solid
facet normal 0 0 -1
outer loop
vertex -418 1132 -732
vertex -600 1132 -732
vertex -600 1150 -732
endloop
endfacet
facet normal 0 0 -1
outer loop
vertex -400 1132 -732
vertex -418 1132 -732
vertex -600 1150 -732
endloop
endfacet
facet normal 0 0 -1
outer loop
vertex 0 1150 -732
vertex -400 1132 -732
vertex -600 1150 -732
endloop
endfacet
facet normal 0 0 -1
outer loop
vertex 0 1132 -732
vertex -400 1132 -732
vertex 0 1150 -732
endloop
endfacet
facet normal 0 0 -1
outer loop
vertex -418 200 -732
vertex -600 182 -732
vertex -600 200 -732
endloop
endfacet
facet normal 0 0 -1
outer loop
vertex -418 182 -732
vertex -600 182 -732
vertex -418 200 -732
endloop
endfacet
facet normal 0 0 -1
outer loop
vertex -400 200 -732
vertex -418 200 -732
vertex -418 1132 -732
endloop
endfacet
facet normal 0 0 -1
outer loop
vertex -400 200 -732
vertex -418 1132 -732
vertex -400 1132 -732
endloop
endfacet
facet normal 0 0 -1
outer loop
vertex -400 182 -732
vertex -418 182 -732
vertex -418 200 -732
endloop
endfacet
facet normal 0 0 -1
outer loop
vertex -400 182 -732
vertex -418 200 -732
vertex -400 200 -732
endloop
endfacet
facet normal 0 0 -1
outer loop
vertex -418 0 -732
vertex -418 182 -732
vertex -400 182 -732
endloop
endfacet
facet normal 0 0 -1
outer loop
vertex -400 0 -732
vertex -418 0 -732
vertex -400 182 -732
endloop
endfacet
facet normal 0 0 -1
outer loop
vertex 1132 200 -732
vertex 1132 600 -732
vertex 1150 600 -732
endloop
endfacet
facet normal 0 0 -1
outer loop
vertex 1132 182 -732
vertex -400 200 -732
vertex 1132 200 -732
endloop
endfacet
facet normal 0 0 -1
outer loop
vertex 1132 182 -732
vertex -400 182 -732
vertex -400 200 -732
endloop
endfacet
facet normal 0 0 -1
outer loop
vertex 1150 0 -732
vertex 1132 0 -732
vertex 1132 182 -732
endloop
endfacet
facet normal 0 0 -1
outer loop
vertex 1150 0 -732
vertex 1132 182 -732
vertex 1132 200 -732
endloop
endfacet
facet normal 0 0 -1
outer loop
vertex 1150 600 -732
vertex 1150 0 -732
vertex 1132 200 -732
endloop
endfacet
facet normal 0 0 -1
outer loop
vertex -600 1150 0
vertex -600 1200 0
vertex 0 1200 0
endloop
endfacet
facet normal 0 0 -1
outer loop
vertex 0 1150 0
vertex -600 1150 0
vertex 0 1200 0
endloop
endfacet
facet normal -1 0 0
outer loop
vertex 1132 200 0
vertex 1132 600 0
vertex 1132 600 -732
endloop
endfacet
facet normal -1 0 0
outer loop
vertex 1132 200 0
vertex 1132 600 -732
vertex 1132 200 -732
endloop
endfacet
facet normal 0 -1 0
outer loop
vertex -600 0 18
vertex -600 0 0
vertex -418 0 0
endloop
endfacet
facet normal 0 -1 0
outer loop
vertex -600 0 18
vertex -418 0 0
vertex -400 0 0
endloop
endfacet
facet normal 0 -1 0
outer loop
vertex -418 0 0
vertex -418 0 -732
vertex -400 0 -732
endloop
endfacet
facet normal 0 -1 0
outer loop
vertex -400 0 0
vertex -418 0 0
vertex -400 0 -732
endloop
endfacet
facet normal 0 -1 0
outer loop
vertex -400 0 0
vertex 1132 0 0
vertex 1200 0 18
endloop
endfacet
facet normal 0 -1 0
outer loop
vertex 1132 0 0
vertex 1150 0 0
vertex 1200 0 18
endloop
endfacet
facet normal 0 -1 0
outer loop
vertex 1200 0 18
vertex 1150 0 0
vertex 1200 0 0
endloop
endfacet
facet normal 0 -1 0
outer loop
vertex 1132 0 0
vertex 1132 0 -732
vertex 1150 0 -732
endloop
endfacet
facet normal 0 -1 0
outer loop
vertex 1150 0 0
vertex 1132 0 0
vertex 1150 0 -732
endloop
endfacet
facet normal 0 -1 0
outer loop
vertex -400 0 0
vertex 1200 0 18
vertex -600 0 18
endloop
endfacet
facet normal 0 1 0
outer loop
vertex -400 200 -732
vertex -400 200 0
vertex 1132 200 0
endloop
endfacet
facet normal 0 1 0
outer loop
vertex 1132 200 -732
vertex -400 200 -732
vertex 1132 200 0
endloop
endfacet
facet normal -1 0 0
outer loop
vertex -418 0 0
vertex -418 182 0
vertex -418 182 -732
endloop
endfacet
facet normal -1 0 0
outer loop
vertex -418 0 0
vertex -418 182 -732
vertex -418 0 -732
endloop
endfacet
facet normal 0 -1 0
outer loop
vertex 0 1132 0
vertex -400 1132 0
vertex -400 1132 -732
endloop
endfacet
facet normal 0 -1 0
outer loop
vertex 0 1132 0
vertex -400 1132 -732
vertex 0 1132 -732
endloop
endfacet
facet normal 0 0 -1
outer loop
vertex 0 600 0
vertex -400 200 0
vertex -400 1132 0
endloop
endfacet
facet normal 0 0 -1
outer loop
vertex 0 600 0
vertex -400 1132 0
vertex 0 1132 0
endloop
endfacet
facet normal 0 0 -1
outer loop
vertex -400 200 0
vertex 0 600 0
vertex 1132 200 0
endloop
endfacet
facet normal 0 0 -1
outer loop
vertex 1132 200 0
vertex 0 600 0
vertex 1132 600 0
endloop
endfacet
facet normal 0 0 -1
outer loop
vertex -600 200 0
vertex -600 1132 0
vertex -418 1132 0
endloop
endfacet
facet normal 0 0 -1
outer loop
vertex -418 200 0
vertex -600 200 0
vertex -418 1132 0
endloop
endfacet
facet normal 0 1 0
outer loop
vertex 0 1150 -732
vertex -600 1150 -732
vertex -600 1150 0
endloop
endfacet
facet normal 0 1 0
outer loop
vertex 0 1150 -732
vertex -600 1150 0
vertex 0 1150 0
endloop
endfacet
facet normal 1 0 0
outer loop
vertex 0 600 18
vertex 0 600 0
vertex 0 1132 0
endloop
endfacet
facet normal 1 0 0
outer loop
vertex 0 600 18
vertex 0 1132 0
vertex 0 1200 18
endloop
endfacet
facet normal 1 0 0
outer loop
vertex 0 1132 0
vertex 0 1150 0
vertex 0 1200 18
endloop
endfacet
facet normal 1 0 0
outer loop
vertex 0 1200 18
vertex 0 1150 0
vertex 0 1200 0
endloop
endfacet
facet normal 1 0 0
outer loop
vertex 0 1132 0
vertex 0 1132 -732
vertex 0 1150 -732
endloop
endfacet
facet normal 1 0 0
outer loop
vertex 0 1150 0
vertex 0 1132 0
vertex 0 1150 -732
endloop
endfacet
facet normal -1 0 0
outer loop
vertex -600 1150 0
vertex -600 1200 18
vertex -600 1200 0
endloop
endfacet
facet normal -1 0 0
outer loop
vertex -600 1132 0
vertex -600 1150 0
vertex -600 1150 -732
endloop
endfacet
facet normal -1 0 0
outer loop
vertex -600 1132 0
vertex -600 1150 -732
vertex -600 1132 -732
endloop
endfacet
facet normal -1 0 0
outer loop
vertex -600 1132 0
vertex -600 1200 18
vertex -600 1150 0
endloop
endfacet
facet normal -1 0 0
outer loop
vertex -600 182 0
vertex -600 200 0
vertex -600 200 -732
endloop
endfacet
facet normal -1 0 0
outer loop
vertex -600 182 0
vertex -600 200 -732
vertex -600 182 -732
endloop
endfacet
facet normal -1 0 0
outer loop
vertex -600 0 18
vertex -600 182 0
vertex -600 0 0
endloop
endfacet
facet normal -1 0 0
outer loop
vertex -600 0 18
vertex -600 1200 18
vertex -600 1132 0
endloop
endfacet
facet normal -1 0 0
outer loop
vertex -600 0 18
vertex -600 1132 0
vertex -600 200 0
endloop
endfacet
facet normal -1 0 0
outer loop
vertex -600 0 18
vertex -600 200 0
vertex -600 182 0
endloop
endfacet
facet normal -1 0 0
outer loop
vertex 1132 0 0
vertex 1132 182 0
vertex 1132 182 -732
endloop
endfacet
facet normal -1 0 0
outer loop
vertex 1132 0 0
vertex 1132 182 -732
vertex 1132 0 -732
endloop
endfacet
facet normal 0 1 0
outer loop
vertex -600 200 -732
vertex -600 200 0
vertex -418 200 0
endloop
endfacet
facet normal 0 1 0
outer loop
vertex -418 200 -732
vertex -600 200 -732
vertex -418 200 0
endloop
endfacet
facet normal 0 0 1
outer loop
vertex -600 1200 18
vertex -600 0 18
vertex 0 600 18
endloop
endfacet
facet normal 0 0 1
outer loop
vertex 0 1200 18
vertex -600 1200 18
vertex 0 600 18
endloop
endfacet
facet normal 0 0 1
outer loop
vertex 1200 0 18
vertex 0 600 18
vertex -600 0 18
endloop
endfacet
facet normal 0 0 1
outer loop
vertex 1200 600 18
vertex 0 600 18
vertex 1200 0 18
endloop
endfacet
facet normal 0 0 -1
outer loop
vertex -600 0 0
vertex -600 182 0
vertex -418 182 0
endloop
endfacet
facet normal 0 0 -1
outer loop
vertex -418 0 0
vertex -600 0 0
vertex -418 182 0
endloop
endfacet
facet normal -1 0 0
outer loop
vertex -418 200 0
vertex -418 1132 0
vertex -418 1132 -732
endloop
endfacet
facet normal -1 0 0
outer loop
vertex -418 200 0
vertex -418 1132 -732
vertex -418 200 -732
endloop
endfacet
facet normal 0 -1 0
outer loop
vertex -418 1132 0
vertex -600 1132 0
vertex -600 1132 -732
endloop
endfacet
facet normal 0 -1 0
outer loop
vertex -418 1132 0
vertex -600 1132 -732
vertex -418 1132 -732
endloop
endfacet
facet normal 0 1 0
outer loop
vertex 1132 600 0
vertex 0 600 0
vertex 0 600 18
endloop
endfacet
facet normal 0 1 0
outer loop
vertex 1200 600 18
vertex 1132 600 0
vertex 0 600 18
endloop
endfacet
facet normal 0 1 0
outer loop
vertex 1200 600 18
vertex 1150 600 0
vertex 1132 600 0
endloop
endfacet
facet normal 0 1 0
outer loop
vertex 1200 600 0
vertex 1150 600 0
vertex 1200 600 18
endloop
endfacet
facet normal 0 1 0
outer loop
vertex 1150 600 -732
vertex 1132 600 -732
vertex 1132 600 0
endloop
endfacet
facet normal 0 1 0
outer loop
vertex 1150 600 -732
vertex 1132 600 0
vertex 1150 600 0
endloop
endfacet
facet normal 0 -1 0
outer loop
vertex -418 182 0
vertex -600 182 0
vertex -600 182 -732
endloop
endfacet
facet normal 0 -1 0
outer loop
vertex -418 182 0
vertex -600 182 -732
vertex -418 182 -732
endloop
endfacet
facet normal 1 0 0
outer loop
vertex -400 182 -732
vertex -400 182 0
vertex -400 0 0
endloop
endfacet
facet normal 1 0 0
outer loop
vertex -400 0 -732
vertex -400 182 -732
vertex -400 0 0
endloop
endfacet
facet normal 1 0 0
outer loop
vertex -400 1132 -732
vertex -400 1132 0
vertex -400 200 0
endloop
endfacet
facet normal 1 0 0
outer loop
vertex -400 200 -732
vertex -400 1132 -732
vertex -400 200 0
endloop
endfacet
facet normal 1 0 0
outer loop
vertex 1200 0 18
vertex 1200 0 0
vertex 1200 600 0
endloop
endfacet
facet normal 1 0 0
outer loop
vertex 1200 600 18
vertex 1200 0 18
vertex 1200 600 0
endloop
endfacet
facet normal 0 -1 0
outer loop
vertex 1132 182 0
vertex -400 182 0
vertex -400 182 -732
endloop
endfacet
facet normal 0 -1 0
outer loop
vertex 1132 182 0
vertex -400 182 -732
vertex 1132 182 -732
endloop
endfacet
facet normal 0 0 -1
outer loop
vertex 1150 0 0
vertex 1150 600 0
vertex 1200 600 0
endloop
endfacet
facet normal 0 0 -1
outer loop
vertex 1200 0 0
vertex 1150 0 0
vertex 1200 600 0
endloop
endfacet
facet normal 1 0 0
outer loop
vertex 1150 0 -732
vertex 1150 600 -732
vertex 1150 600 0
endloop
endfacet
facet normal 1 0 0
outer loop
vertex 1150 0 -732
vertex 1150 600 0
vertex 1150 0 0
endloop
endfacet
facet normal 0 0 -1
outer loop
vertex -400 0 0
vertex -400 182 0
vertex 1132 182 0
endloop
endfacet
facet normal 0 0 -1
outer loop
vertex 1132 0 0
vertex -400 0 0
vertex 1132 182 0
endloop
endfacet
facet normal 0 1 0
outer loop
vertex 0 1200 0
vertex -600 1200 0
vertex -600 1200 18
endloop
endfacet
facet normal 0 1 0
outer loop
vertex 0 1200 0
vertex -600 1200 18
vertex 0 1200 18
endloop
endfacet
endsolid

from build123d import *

# Parameters (mm, degrees)
F0_W      = 1200
F0_H      = 600
F1_DEPTH  = 18
F2_W      = 600
F2_H      = 1200
F3_DEPTH  = 18
F4_W      = 18
F4_H      = 600
F4_W_2    = 600
F4_H_2    = 18
F5_DEPTH  = 732
F6_W      = 18
F6_H      = 1132
F7_DEPTH  = 732
F8_DEPTH  = 18
F9_W      = 1732
F9_H      = 18
F10_DEPTH = 732


with BuildPart() as f1:
    # F0 (on Top) → F1 (new body)
    with BuildSketch(Plane.XY):
        with Locations((600, 300)):
            Rectangle(F0_W, F0_H)
    extrude(amount=F1_DEPTH)

    # F2 (on Top) → F3 (join)
    with BuildSketch(Plane.XY):
        with Locations((-300, 600)):
            Rectangle(F2_W, F2_H)
    extrude(amount=F3_DEPTH)

    # F4 (on face) → F5 (join)
    with BuildSketch(Plane(origin=(0, 0, 0), x_dir=(1, 0, 0), z_dir=(0, 0, -1))):
        with Locations((1141, -300)):
            Rectangle(F4_W, F4_H)
        with Locations((-300, -1141)):
            Rectangle(F4_W_2, F4_H_2)
    extrude(amount=F5_DEPTH)

    # F6 (on face) → F7 (join)
    with BuildSketch(Plane(origin=(0, 0, 0), x_dir=(1, 0, 0), z_dir=(0, 0, -1))):
        with Locations((-409, -566)):
            Rectangle(F6_W, F6_H)
    extrude(amount=F7_DEPTH)

    # F7_face (on face) → F8 (join)
    with BuildSketch(Plane(origin=(259.6, 406.4, 0), x_dir=(1, 0, 0), z_dir=(0, 0, -1))):
        Polygon((872.4, 406.4), (-659.6, 406.4), (-659.6, -725.6), (-259.6, -725.6), (-259.6, -193.6), (872.4, -193.6), align=None)
    extrude(amount=-F8_DEPTH)

    # F9 (on face) → F10 (join)
    with BuildSketch(Plane(origin=(0, 0, 0), x_dir=(1, 0, 0), z_dir=(0, 0, -1))):
        with Locations((266, -191)):
            Rectangle(F9_W, F9_H)
    extrude(amount=F10_DEPTH)


solid = f1.part
